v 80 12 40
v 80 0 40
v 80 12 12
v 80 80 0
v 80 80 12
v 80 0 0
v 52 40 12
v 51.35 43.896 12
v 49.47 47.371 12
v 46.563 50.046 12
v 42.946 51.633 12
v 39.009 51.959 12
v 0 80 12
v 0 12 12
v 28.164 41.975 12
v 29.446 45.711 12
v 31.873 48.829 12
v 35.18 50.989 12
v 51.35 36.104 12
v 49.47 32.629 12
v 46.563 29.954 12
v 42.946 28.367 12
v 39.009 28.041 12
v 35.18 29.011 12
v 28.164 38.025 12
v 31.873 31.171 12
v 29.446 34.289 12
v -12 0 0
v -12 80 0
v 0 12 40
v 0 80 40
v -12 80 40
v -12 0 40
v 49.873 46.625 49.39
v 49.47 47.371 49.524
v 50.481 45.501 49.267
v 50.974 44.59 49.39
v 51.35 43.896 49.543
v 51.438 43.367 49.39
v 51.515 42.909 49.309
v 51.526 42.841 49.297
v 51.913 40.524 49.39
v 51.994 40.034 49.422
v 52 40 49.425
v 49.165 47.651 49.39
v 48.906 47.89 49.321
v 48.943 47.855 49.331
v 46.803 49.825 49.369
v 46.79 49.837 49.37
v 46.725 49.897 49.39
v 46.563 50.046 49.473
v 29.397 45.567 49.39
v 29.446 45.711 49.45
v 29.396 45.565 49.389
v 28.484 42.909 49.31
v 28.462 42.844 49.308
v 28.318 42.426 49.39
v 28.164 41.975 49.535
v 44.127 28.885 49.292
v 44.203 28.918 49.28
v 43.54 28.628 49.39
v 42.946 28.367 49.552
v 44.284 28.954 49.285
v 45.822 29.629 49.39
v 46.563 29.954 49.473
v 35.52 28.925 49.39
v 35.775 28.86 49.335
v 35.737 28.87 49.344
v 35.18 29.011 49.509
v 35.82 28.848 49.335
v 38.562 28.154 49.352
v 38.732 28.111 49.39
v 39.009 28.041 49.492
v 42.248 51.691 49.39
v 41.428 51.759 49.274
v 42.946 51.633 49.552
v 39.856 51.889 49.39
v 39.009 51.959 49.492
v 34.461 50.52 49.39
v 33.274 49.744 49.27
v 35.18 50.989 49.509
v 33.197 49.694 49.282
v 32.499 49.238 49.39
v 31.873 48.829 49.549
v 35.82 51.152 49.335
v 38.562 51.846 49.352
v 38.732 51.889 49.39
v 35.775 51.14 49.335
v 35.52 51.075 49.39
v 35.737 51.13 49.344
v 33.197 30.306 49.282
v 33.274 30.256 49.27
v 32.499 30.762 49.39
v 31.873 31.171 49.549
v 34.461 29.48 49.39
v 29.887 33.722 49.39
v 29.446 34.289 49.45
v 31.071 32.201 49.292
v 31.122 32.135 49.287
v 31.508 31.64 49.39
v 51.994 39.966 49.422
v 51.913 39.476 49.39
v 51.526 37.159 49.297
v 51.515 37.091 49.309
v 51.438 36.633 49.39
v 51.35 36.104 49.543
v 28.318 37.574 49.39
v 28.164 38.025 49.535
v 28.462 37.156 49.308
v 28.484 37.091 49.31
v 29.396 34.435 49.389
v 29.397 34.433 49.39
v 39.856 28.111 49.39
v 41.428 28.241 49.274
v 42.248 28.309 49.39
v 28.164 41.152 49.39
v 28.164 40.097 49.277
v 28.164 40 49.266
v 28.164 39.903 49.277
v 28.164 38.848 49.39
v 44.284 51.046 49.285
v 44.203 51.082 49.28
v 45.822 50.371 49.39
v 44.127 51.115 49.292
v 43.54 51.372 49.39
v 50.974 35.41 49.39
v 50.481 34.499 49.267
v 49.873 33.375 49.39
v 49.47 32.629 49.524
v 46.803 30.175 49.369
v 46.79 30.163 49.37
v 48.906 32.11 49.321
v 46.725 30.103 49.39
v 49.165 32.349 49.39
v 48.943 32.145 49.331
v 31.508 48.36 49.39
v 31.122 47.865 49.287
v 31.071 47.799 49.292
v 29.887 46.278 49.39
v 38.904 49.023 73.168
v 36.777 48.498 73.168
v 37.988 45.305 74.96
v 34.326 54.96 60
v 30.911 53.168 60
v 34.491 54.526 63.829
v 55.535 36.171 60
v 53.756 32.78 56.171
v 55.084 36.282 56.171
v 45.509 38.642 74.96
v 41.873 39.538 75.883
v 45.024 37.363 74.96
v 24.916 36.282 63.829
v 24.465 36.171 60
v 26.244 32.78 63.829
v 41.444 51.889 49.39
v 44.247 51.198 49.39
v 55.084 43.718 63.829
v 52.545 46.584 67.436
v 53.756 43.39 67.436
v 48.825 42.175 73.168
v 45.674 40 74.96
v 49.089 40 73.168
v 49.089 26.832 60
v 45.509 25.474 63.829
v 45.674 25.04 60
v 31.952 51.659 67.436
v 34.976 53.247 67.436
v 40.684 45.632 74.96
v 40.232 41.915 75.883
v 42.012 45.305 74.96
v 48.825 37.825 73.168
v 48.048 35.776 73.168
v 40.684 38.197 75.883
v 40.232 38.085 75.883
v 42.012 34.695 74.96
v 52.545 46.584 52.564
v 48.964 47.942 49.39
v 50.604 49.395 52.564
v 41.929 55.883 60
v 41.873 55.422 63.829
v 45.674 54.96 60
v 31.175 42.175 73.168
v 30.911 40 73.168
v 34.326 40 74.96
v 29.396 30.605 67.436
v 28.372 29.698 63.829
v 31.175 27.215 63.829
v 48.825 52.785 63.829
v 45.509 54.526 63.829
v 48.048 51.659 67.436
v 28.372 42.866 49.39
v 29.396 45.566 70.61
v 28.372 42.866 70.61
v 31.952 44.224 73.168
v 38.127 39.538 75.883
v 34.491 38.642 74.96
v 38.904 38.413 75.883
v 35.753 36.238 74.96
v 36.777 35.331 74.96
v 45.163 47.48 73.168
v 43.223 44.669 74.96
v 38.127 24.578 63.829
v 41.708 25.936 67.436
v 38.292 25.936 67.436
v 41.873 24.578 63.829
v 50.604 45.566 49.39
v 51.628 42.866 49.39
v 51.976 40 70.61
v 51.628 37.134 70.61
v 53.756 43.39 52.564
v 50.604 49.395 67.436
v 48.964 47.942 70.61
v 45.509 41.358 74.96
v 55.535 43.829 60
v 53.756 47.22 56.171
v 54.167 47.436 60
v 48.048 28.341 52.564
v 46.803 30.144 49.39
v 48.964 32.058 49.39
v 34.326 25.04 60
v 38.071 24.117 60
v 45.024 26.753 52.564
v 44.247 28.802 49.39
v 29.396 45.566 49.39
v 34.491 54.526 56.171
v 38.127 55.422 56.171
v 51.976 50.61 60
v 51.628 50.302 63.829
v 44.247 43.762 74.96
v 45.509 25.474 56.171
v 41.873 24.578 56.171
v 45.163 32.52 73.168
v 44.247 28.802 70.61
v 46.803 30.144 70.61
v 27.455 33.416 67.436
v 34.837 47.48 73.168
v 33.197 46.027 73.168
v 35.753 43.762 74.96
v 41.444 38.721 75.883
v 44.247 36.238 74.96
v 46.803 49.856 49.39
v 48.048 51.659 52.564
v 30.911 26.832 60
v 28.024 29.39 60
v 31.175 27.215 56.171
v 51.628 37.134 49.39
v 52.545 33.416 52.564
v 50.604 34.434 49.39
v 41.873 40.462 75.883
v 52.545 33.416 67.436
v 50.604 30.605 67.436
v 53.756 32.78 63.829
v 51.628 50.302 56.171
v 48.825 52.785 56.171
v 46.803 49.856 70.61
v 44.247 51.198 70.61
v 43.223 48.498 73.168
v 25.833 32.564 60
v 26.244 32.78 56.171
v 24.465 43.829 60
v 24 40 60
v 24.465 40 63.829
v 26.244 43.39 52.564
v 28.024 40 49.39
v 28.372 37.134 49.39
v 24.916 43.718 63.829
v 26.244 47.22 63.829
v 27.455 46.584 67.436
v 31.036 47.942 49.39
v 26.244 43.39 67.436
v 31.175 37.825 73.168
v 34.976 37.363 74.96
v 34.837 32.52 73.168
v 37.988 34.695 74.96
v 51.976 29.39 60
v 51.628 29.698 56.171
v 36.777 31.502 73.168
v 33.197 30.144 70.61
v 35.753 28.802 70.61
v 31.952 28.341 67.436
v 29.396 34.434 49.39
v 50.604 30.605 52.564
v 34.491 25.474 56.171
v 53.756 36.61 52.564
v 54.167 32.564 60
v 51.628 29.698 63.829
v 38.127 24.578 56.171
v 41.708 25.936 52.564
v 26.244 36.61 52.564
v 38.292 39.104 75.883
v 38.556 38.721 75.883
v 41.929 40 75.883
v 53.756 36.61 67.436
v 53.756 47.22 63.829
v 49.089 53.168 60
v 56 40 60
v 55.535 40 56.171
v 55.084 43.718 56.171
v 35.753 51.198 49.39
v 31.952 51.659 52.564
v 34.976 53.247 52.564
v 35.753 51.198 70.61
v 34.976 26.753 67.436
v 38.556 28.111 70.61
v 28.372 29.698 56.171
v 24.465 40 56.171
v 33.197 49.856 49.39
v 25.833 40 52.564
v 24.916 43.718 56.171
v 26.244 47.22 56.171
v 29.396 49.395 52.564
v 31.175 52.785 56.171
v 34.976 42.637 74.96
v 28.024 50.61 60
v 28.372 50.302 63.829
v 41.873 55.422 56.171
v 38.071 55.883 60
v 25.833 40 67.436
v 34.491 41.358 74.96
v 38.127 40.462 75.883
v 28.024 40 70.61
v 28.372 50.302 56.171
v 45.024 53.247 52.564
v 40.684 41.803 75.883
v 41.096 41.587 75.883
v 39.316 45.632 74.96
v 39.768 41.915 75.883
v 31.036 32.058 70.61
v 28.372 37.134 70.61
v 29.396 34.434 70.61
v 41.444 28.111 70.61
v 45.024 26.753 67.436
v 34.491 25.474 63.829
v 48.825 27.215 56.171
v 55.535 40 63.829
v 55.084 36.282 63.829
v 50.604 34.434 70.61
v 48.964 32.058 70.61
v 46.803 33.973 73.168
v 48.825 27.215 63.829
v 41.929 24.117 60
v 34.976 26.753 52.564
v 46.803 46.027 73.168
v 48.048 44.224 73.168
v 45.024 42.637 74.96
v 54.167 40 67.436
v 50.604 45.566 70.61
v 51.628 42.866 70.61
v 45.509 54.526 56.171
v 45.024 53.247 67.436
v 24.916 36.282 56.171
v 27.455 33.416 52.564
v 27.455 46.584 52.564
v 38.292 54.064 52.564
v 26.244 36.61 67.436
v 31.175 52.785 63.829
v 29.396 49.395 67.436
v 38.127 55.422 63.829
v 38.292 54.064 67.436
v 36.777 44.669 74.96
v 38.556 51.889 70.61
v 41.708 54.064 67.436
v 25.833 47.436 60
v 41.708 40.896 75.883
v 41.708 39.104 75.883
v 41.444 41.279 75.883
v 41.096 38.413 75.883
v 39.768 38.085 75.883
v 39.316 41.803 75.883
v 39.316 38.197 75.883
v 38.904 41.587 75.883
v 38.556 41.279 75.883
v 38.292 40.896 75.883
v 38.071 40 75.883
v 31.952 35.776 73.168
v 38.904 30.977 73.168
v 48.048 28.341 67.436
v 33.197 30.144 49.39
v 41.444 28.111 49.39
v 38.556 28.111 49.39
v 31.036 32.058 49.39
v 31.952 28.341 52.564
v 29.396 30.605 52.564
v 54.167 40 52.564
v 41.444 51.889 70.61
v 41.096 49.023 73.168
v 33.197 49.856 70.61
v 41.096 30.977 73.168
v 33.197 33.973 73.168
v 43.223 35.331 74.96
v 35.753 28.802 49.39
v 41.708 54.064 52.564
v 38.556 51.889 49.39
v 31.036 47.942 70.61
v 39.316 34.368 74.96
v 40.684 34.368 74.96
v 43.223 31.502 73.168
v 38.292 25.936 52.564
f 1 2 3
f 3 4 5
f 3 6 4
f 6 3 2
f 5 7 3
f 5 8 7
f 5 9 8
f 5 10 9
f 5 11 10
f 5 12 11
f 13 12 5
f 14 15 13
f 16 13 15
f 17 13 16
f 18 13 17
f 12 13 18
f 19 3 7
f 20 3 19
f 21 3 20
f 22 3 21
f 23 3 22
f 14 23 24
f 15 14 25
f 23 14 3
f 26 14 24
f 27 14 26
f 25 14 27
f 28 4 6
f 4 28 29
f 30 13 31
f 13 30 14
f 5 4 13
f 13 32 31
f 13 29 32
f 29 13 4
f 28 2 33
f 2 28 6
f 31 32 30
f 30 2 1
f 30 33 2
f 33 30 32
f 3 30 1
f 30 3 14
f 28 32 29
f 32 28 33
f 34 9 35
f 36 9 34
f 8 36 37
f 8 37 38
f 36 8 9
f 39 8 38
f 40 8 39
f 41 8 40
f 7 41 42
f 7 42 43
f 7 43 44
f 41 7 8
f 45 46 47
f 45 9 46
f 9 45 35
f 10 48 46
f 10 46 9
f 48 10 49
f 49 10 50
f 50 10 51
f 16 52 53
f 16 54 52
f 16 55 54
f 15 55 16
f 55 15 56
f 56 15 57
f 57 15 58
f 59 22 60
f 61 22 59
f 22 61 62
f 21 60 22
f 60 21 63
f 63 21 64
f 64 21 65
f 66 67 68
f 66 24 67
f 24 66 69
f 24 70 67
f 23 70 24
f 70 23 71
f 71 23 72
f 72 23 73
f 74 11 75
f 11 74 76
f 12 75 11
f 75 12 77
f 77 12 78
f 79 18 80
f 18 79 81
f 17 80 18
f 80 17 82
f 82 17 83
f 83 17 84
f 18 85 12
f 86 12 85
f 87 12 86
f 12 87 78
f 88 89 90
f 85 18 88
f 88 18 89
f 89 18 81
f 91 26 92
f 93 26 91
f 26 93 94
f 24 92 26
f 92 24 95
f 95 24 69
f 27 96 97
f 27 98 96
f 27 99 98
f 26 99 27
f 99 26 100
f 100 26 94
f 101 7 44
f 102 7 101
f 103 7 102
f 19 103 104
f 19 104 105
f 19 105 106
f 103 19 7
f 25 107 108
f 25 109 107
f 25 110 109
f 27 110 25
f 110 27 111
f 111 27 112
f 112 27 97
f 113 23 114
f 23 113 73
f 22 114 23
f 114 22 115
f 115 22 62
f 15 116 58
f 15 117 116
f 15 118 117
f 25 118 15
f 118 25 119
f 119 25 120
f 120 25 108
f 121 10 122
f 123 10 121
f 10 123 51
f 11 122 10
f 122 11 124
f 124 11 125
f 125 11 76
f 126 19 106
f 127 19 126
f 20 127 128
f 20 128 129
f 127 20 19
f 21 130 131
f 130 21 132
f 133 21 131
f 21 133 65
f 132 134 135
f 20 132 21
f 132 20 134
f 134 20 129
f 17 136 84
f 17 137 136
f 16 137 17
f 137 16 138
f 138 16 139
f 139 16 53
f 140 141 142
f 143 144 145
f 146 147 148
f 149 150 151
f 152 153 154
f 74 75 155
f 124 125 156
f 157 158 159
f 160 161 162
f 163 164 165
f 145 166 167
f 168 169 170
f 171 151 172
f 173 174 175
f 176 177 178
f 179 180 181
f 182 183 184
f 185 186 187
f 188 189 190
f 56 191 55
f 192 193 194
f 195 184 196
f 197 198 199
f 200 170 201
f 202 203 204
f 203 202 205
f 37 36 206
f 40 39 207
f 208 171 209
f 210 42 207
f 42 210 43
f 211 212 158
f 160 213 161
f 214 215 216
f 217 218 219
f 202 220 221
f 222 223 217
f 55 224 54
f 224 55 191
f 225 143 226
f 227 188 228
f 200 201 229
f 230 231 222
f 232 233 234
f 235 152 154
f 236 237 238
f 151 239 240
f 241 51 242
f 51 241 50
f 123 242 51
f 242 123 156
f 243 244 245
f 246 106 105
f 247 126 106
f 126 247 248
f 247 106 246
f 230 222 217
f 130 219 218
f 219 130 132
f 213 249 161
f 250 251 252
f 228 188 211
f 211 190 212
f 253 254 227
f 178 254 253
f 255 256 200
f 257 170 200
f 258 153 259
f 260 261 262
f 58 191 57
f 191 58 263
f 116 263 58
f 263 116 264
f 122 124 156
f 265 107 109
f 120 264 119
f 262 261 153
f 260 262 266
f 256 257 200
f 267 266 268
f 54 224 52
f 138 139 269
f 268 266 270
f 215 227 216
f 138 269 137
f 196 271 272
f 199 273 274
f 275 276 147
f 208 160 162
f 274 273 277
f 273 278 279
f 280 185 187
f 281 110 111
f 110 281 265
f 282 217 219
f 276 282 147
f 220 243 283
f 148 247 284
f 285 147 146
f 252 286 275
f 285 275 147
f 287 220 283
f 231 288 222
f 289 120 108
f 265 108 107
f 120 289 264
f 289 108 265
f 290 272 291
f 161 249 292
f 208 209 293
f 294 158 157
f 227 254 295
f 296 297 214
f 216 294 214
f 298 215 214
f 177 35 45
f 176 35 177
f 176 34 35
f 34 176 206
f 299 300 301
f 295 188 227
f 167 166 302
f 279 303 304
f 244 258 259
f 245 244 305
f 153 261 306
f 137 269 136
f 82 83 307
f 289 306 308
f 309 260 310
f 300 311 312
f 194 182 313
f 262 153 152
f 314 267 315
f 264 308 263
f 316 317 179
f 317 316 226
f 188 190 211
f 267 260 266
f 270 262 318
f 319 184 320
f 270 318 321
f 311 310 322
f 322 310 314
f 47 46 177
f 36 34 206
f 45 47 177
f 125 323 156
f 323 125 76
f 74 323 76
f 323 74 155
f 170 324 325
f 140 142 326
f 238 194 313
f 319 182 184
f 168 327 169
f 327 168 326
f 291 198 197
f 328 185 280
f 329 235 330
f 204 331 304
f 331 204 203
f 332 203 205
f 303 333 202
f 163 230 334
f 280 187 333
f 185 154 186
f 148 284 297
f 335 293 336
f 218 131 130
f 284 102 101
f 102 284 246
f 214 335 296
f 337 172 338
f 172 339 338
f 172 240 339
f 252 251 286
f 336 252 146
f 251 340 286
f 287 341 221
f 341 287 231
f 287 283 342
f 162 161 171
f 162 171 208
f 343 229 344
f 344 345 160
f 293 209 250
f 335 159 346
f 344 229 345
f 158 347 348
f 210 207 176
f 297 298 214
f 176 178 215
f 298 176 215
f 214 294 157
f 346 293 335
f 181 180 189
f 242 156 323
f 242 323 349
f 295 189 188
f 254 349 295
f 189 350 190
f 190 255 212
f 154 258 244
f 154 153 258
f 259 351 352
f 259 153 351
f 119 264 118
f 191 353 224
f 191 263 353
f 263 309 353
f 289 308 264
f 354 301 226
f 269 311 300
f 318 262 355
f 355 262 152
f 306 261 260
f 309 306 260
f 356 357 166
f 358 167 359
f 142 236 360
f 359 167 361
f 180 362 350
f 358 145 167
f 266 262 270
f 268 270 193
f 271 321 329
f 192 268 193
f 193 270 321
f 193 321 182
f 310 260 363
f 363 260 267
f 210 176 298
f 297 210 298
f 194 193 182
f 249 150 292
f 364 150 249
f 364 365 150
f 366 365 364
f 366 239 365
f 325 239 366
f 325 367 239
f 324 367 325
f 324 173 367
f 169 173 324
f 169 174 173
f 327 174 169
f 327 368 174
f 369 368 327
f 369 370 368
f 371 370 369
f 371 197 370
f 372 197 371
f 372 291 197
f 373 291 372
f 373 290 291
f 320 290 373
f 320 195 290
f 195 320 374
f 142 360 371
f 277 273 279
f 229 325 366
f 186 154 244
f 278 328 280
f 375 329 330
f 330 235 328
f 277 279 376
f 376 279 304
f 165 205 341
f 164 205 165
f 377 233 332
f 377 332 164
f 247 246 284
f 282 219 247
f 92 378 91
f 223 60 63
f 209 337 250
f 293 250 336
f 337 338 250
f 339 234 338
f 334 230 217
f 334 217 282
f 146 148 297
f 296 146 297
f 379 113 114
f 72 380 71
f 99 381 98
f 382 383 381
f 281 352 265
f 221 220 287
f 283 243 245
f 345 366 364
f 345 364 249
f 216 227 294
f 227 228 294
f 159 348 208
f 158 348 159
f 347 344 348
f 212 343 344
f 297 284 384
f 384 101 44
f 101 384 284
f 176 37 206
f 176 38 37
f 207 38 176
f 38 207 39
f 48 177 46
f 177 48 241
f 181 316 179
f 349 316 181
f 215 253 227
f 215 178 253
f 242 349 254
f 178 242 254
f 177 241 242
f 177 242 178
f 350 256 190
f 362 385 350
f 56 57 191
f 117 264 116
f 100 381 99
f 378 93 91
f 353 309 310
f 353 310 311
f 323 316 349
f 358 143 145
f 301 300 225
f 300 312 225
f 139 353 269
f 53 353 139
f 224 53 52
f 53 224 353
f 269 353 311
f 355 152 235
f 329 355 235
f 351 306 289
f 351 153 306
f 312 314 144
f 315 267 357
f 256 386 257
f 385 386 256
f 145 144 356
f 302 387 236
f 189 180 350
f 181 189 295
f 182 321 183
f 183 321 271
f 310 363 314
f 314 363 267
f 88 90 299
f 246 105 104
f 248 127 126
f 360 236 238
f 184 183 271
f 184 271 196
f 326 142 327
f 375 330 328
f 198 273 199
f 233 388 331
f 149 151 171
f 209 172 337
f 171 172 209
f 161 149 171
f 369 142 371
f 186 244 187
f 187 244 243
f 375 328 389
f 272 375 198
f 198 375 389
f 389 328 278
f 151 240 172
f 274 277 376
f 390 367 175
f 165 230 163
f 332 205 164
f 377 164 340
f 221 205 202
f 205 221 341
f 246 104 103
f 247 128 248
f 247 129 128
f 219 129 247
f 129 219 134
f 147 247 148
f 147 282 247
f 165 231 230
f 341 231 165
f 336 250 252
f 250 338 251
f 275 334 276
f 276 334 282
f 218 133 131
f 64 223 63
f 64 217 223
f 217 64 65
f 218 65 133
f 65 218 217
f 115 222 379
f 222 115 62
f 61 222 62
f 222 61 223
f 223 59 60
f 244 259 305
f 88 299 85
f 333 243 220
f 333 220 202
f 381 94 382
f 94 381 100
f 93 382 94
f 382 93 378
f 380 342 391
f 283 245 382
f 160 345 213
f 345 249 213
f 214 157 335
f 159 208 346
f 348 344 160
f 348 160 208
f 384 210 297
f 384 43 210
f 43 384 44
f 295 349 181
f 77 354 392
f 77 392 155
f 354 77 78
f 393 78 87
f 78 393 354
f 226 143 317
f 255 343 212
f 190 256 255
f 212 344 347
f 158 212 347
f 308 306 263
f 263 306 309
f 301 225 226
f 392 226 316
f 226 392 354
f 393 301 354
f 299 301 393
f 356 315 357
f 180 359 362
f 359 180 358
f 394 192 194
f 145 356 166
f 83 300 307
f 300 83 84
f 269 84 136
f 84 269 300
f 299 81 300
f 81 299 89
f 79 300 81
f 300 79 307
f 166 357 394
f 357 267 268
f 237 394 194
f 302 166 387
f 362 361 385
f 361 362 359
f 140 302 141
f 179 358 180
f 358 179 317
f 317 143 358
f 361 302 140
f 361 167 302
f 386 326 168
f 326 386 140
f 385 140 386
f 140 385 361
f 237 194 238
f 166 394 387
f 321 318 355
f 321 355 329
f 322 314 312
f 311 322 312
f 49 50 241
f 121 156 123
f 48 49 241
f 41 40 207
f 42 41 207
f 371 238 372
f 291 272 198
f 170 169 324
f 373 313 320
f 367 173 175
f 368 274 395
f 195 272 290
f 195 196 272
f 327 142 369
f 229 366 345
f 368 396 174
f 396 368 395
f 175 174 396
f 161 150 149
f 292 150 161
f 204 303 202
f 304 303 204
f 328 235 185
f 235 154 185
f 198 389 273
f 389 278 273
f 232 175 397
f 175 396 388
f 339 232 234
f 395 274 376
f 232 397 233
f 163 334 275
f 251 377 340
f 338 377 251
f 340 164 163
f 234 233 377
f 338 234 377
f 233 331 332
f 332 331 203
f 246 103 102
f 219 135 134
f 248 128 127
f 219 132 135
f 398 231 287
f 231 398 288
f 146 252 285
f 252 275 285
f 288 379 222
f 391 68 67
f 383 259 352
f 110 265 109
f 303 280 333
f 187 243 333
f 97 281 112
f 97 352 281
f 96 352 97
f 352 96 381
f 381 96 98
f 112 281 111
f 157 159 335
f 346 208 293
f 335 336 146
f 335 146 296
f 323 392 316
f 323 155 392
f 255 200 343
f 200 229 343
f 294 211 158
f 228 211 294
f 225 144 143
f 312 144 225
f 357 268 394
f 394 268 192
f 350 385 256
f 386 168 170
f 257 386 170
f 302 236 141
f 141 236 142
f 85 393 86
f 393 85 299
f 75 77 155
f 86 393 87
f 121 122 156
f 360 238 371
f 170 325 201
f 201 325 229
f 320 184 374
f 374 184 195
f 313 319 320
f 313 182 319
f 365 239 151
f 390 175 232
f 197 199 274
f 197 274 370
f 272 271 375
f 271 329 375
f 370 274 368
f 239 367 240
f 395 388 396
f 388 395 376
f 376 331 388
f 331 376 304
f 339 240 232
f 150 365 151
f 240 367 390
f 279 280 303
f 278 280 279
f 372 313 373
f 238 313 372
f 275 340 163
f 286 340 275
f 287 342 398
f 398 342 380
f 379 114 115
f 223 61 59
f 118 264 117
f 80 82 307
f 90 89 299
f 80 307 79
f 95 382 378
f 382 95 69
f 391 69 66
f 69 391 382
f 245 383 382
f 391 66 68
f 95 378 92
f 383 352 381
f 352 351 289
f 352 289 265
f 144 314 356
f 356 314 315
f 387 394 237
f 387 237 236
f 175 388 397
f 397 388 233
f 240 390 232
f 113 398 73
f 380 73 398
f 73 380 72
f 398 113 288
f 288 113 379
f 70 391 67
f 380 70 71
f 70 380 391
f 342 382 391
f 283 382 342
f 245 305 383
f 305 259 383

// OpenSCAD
scale([2,2,2]) union() {
    cube([40,40,6]);
    rotate([0,0,0])
    cube([40,6,20]);
    rotate([0,0,90])
    cube([40,6,20]);
    rotate([0,0,90])
    cube([40,6,20]);
    translate([20,20,13])
    cylinder(h=25, d=12, center=true);
    translate([20,20,30])
    sphere(8);
}
